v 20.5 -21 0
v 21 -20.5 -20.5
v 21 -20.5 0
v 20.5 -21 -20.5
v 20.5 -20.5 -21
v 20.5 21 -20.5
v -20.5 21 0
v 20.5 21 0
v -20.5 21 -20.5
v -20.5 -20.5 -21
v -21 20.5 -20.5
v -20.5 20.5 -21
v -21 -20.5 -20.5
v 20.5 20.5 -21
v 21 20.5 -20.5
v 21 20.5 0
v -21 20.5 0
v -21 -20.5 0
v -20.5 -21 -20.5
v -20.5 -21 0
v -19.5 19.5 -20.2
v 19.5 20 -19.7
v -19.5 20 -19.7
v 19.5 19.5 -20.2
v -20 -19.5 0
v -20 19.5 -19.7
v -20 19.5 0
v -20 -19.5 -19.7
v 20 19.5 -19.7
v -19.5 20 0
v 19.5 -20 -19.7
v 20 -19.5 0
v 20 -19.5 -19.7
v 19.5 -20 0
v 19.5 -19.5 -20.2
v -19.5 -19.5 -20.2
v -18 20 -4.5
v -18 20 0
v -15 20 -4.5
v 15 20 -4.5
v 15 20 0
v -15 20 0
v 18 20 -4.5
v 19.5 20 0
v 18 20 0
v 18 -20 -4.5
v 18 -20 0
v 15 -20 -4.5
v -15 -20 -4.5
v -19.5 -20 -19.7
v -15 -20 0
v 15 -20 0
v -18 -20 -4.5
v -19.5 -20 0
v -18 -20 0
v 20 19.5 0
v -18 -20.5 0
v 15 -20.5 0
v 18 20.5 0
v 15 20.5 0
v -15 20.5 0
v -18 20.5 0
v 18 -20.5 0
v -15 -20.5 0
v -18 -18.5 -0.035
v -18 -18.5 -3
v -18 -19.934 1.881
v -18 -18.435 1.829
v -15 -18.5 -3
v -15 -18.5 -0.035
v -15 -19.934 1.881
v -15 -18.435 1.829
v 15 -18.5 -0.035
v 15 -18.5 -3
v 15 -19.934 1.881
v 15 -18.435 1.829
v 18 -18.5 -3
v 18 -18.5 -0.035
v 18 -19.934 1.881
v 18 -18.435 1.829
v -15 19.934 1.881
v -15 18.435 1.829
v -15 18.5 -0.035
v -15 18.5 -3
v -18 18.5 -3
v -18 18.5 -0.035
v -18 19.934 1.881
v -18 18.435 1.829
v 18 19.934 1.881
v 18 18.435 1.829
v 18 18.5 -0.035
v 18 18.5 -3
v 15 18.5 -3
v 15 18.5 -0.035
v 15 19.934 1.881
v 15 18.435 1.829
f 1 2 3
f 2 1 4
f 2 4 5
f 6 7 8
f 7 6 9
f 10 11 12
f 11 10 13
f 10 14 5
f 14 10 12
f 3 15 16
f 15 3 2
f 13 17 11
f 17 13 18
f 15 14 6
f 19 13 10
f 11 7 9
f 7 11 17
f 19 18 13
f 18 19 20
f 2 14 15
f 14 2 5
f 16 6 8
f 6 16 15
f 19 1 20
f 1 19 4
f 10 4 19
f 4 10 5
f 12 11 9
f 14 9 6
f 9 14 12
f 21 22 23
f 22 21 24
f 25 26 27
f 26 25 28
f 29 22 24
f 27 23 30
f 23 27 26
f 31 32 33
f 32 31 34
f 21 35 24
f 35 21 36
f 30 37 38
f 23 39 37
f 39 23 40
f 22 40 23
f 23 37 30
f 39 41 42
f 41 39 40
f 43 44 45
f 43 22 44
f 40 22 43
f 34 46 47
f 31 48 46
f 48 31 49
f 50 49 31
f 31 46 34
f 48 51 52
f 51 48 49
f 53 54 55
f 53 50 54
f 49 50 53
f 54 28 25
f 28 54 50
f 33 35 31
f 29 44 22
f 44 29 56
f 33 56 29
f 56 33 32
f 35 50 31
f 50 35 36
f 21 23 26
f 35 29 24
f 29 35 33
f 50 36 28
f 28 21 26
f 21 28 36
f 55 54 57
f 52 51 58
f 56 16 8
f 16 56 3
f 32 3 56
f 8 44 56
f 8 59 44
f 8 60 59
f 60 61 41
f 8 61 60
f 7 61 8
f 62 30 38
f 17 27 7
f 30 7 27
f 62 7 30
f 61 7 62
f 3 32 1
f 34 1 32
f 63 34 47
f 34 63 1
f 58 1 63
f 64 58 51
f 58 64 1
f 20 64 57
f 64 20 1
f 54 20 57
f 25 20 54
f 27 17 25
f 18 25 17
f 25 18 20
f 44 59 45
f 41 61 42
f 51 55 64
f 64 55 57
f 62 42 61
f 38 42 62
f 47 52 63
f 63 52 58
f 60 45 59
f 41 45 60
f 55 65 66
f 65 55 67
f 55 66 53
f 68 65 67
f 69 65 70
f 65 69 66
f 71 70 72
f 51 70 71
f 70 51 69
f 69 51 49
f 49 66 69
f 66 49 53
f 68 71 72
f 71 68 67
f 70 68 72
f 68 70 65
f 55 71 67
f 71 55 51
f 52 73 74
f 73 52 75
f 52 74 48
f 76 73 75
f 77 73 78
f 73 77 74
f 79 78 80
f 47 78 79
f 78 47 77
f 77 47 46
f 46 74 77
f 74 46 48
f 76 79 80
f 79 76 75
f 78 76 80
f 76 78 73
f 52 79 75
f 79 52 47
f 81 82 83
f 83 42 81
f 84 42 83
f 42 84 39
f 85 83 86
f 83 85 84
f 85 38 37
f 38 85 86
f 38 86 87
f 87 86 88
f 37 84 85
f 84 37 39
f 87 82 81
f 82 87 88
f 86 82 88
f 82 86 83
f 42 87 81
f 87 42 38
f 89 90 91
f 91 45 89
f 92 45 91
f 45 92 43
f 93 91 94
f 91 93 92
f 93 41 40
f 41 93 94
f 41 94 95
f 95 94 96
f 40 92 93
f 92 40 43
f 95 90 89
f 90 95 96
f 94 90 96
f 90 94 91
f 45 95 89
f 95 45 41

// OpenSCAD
module octaeder(size)scale(size)hull()for(i=[0,180])rotate([i,0,0])cylinder(r1=1,r2=0,h=1,$fn=4);

module chamfercube(x=[1,1,1],chamfer=0,center=false)
translate([1,1,1]*chamfer-x*(center?0.5:0.0))
minkowski(){
octaeder(chamfer);
cube(x-(2*chamfer*[1,1,1]));
}
difference(){
chamfercube([42,42,42],0.5,center=true);
chamfercube([40,40,40.4],0.5,center=true);
translate([-50,-50,0])cube(100);
}
module peg()translate([-1.5,-0.5,0])
{translate([0,0,-3])hull(){translate([0,0,-1.5])cube([3,0.5,0.5]);cube([3,2,3]);}
rotate([-2,0,0])translate([0,0.5,-0.1])cube([3,1.5,2]);
}
for(i=[[-16.5,-20,0],[16.5,-20,0],[-16.5,20,0],[16.5,20,0]])translate(i)rotate(i[1]>0?180:0)peg();
